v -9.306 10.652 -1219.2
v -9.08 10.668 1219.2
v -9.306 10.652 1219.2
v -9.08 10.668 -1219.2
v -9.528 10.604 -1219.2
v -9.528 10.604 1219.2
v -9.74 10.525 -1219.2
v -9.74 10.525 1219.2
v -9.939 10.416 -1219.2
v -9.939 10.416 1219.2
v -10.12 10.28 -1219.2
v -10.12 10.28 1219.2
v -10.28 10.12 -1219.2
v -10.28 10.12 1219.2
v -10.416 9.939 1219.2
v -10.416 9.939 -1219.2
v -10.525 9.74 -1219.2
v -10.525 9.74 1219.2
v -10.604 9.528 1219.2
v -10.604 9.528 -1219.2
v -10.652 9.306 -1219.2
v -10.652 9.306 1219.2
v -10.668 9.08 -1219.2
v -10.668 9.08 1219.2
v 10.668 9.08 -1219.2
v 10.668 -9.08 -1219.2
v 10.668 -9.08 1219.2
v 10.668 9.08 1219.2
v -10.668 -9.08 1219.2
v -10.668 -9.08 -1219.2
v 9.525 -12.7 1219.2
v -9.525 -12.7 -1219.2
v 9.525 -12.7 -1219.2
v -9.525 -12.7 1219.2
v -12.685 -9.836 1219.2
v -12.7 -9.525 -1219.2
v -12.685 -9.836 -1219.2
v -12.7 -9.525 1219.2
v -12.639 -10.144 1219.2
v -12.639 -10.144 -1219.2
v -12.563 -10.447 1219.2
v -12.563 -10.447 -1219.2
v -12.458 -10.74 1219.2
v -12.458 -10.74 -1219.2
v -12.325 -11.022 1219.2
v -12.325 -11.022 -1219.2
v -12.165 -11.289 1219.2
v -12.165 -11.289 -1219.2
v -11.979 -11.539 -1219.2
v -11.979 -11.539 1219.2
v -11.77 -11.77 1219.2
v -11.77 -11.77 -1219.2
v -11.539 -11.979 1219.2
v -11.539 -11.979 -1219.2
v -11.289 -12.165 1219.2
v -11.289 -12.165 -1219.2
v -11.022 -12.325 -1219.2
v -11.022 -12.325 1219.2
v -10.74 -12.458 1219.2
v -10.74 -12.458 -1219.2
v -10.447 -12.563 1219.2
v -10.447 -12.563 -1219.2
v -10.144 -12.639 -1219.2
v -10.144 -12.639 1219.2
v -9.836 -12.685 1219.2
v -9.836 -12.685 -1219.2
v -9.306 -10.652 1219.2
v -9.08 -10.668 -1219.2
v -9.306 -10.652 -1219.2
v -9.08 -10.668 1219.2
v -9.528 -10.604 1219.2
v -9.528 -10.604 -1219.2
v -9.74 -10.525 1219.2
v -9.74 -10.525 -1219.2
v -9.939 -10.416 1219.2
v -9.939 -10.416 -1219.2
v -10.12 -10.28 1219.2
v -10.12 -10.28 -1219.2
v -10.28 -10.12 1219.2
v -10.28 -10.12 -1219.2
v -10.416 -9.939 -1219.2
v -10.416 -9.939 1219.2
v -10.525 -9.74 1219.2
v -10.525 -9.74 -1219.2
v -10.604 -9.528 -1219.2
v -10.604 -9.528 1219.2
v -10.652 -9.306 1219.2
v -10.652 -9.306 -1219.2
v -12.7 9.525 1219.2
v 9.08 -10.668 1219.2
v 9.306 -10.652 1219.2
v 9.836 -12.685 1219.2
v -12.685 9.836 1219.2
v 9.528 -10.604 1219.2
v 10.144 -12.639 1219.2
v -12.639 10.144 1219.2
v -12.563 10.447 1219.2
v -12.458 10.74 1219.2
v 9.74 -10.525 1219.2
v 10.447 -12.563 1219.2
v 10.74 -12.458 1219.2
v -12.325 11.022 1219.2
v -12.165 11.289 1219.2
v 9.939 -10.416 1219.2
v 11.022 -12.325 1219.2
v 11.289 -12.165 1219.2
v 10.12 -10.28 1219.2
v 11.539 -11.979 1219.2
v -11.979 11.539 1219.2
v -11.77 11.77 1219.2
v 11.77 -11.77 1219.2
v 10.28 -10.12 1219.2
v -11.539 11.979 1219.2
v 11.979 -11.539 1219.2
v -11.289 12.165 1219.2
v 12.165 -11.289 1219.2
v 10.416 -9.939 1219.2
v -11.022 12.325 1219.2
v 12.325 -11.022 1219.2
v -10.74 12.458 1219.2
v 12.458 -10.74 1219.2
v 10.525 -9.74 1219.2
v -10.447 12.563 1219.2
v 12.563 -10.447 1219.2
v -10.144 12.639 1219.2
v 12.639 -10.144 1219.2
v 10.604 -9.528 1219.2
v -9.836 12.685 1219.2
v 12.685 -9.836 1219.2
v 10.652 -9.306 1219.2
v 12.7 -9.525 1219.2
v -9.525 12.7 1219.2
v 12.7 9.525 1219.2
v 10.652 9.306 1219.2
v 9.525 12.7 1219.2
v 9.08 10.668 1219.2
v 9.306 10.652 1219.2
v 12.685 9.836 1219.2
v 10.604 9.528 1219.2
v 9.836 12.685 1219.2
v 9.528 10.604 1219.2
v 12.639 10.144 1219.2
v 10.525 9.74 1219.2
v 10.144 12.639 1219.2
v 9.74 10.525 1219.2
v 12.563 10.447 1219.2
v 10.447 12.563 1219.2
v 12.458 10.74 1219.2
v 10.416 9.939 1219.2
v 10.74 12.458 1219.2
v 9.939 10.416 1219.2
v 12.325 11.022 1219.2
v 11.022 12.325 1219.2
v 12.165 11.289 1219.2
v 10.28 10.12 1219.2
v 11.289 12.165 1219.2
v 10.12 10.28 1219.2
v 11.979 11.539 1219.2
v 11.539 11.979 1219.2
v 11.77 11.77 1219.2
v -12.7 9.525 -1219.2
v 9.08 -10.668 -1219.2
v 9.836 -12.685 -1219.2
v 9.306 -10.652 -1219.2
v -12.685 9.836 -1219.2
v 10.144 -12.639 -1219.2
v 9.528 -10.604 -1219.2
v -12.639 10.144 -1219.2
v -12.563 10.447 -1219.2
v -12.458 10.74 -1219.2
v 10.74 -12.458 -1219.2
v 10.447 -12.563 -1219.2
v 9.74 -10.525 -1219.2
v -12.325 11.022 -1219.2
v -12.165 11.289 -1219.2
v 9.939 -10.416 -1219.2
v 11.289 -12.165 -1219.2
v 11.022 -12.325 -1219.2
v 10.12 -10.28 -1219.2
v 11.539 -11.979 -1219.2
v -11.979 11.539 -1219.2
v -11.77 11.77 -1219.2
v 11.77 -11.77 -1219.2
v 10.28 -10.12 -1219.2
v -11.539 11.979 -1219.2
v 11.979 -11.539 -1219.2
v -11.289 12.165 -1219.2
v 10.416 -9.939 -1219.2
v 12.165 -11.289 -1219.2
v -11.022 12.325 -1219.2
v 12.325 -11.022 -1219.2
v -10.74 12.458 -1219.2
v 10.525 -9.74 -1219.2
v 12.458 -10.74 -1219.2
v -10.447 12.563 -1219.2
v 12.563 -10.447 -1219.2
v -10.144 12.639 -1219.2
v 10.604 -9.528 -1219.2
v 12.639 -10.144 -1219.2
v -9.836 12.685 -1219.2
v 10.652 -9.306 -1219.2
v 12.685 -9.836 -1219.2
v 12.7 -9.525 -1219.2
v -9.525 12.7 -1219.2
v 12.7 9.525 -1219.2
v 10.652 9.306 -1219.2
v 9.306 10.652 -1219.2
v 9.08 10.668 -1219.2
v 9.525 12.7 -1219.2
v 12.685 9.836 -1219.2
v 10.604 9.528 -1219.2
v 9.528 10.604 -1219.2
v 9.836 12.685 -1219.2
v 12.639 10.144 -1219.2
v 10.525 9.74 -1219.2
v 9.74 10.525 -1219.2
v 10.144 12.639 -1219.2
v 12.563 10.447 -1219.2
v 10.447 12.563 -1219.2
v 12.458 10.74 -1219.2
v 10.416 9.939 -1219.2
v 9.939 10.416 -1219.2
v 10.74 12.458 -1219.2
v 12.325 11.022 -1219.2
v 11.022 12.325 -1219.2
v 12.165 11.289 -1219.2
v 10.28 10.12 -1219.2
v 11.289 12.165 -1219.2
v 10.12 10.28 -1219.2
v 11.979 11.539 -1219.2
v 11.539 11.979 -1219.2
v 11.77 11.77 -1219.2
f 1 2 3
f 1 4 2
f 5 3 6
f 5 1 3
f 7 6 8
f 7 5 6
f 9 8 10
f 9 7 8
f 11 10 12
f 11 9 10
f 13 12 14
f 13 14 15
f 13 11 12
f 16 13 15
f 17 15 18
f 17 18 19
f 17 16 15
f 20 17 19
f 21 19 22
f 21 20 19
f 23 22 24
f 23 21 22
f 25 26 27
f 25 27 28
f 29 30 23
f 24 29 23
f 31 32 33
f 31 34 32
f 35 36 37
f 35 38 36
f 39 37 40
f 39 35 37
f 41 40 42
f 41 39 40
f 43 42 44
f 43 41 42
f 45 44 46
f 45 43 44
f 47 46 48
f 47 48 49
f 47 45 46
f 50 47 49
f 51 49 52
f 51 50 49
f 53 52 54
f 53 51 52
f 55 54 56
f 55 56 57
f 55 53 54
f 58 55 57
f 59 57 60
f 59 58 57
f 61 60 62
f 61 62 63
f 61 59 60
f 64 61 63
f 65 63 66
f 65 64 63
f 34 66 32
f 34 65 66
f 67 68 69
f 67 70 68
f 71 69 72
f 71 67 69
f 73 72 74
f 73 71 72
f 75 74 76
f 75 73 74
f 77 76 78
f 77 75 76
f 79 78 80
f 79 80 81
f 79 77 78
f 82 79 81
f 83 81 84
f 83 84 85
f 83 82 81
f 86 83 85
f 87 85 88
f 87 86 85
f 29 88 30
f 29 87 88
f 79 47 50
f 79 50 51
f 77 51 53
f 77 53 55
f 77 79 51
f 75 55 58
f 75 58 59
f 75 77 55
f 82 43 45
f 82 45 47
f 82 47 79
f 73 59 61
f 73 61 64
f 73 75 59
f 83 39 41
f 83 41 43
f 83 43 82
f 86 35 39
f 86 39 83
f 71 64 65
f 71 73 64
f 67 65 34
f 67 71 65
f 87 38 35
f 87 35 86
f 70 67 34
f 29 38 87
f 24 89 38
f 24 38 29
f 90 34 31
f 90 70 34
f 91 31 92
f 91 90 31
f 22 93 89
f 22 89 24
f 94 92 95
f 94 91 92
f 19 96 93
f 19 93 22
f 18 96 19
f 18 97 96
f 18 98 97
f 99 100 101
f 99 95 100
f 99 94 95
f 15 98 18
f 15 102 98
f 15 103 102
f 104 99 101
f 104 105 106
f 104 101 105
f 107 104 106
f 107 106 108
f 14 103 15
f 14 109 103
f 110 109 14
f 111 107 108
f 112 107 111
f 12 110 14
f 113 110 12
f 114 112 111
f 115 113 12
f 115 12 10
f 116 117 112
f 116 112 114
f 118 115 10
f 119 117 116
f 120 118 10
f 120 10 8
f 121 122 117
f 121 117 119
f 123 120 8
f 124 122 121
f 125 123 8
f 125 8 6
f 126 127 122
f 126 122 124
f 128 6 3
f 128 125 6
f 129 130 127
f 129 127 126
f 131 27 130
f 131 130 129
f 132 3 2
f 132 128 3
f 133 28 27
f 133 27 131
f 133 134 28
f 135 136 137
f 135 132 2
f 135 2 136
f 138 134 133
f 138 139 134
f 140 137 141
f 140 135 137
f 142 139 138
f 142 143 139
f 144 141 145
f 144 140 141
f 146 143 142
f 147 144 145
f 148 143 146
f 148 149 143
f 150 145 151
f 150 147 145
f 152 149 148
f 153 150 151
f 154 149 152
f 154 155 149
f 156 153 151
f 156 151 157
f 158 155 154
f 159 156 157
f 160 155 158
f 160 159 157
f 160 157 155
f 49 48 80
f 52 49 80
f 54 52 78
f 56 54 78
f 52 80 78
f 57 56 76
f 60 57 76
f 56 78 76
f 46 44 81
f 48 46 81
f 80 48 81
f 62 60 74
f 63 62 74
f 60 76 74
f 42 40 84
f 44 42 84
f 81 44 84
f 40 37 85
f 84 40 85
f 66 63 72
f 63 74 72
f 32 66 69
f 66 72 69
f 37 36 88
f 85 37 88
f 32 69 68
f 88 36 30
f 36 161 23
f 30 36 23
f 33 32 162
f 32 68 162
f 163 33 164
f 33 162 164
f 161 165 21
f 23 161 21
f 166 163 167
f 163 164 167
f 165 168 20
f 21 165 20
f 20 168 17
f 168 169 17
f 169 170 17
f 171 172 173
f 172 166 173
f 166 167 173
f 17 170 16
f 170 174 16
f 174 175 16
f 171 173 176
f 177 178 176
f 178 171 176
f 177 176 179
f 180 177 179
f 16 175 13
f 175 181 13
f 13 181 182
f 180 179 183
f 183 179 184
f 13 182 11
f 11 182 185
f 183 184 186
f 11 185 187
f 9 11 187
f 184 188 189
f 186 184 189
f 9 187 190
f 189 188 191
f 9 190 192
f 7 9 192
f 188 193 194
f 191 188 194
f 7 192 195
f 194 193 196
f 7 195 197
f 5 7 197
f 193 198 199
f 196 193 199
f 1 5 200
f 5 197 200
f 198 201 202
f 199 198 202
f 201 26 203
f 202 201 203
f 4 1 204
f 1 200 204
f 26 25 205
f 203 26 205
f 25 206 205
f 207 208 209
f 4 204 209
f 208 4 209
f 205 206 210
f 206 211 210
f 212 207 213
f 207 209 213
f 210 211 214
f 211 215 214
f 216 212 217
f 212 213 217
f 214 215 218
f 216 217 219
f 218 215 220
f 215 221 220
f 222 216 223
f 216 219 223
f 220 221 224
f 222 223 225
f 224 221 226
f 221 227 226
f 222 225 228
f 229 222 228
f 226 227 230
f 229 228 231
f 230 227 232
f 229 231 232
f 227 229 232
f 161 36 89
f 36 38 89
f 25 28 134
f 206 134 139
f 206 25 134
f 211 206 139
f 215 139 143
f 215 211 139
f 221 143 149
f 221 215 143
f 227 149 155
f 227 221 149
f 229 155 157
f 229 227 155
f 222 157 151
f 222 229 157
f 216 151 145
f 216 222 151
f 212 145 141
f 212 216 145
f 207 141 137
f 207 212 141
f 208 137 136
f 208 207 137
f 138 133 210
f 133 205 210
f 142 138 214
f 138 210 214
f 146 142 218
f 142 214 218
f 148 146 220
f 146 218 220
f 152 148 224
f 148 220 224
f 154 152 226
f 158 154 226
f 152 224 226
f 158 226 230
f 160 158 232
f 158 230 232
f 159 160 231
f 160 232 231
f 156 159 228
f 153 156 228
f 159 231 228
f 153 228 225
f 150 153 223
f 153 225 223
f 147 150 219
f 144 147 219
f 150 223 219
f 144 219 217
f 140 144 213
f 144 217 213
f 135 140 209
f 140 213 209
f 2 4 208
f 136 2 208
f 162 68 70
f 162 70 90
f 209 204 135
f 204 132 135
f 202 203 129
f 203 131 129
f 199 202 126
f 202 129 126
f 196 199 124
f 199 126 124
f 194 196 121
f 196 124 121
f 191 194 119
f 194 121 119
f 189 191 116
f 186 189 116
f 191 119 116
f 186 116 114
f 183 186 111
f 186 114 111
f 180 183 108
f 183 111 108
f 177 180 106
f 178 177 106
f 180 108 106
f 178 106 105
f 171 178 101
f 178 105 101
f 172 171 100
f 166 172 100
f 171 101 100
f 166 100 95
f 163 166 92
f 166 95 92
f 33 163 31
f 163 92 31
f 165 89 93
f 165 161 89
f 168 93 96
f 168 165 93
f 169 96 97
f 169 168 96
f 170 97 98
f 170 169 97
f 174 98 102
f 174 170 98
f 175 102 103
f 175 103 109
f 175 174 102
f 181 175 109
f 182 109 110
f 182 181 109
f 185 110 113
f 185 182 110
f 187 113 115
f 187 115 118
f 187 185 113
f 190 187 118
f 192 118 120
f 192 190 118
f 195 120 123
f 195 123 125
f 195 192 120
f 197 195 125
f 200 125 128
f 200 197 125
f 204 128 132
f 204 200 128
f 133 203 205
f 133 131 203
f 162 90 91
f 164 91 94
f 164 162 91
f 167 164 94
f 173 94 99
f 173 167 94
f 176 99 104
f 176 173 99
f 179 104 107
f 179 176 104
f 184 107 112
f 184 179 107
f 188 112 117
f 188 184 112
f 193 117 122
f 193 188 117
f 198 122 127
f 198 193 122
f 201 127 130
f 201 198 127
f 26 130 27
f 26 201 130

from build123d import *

# Parameters (mm, degrees)
SKETCH3_W                = 25.4
SKETCH3_H                = 25.4
SKETCH3_W_2              = 21.336
SKETCH3_H_2              = 21.336
BOSS_EXTRUDE1_DEPTH      = 1219.2
BOSS_EXTRUDE1_DEPTH_BACK = 1219.2
FILLET1_R                = 3.175
FILLET2_R                = 1.5875


with BuildPart() as part:
    # Sketch3 → Boss-Extrude1 (new body, two sides)
    with BuildSketch(Plane.XY) as boss_extrude1_sk:
        Rectangle(SKETCH3_W, SKETCH3_H)
        Rectangle(SKETCH3_W_2, SKETCH3_H_2, mode=Mode.SUBTRACT)
    extrude(amount=BOSS_EXTRUDE1_DEPTH)
    extrude(boss_extrude1_sk.sketch, amount=-BOSS_EXTRUDE1_DEPTH_BACK)

    # Fillet1
    fillet1_edges = [part.edges().sort_by_distance(p)[0] for p in [
        (12.7, -12.7, 0),
        (-12.7, -12.7, 0),
        (-12.7, 12.7, 0),
        (12.7, 12.7, 0),
    ]]
    fillet(fillet1_edges, radius=FILLET1_R)

    # Fillet2
    fillet2_edges = [part.edges().sort_by_distance(p)[0] for p in [
        (10.668, -10.668, 0),
        (10.668, 10.668, 0),
        (-10.668, 10.668, 0),
        (-10.668, -10.668, 0),
    ]]
    fillet(fillet2_edges, radius=FILLET2_R)


solid = part.part
